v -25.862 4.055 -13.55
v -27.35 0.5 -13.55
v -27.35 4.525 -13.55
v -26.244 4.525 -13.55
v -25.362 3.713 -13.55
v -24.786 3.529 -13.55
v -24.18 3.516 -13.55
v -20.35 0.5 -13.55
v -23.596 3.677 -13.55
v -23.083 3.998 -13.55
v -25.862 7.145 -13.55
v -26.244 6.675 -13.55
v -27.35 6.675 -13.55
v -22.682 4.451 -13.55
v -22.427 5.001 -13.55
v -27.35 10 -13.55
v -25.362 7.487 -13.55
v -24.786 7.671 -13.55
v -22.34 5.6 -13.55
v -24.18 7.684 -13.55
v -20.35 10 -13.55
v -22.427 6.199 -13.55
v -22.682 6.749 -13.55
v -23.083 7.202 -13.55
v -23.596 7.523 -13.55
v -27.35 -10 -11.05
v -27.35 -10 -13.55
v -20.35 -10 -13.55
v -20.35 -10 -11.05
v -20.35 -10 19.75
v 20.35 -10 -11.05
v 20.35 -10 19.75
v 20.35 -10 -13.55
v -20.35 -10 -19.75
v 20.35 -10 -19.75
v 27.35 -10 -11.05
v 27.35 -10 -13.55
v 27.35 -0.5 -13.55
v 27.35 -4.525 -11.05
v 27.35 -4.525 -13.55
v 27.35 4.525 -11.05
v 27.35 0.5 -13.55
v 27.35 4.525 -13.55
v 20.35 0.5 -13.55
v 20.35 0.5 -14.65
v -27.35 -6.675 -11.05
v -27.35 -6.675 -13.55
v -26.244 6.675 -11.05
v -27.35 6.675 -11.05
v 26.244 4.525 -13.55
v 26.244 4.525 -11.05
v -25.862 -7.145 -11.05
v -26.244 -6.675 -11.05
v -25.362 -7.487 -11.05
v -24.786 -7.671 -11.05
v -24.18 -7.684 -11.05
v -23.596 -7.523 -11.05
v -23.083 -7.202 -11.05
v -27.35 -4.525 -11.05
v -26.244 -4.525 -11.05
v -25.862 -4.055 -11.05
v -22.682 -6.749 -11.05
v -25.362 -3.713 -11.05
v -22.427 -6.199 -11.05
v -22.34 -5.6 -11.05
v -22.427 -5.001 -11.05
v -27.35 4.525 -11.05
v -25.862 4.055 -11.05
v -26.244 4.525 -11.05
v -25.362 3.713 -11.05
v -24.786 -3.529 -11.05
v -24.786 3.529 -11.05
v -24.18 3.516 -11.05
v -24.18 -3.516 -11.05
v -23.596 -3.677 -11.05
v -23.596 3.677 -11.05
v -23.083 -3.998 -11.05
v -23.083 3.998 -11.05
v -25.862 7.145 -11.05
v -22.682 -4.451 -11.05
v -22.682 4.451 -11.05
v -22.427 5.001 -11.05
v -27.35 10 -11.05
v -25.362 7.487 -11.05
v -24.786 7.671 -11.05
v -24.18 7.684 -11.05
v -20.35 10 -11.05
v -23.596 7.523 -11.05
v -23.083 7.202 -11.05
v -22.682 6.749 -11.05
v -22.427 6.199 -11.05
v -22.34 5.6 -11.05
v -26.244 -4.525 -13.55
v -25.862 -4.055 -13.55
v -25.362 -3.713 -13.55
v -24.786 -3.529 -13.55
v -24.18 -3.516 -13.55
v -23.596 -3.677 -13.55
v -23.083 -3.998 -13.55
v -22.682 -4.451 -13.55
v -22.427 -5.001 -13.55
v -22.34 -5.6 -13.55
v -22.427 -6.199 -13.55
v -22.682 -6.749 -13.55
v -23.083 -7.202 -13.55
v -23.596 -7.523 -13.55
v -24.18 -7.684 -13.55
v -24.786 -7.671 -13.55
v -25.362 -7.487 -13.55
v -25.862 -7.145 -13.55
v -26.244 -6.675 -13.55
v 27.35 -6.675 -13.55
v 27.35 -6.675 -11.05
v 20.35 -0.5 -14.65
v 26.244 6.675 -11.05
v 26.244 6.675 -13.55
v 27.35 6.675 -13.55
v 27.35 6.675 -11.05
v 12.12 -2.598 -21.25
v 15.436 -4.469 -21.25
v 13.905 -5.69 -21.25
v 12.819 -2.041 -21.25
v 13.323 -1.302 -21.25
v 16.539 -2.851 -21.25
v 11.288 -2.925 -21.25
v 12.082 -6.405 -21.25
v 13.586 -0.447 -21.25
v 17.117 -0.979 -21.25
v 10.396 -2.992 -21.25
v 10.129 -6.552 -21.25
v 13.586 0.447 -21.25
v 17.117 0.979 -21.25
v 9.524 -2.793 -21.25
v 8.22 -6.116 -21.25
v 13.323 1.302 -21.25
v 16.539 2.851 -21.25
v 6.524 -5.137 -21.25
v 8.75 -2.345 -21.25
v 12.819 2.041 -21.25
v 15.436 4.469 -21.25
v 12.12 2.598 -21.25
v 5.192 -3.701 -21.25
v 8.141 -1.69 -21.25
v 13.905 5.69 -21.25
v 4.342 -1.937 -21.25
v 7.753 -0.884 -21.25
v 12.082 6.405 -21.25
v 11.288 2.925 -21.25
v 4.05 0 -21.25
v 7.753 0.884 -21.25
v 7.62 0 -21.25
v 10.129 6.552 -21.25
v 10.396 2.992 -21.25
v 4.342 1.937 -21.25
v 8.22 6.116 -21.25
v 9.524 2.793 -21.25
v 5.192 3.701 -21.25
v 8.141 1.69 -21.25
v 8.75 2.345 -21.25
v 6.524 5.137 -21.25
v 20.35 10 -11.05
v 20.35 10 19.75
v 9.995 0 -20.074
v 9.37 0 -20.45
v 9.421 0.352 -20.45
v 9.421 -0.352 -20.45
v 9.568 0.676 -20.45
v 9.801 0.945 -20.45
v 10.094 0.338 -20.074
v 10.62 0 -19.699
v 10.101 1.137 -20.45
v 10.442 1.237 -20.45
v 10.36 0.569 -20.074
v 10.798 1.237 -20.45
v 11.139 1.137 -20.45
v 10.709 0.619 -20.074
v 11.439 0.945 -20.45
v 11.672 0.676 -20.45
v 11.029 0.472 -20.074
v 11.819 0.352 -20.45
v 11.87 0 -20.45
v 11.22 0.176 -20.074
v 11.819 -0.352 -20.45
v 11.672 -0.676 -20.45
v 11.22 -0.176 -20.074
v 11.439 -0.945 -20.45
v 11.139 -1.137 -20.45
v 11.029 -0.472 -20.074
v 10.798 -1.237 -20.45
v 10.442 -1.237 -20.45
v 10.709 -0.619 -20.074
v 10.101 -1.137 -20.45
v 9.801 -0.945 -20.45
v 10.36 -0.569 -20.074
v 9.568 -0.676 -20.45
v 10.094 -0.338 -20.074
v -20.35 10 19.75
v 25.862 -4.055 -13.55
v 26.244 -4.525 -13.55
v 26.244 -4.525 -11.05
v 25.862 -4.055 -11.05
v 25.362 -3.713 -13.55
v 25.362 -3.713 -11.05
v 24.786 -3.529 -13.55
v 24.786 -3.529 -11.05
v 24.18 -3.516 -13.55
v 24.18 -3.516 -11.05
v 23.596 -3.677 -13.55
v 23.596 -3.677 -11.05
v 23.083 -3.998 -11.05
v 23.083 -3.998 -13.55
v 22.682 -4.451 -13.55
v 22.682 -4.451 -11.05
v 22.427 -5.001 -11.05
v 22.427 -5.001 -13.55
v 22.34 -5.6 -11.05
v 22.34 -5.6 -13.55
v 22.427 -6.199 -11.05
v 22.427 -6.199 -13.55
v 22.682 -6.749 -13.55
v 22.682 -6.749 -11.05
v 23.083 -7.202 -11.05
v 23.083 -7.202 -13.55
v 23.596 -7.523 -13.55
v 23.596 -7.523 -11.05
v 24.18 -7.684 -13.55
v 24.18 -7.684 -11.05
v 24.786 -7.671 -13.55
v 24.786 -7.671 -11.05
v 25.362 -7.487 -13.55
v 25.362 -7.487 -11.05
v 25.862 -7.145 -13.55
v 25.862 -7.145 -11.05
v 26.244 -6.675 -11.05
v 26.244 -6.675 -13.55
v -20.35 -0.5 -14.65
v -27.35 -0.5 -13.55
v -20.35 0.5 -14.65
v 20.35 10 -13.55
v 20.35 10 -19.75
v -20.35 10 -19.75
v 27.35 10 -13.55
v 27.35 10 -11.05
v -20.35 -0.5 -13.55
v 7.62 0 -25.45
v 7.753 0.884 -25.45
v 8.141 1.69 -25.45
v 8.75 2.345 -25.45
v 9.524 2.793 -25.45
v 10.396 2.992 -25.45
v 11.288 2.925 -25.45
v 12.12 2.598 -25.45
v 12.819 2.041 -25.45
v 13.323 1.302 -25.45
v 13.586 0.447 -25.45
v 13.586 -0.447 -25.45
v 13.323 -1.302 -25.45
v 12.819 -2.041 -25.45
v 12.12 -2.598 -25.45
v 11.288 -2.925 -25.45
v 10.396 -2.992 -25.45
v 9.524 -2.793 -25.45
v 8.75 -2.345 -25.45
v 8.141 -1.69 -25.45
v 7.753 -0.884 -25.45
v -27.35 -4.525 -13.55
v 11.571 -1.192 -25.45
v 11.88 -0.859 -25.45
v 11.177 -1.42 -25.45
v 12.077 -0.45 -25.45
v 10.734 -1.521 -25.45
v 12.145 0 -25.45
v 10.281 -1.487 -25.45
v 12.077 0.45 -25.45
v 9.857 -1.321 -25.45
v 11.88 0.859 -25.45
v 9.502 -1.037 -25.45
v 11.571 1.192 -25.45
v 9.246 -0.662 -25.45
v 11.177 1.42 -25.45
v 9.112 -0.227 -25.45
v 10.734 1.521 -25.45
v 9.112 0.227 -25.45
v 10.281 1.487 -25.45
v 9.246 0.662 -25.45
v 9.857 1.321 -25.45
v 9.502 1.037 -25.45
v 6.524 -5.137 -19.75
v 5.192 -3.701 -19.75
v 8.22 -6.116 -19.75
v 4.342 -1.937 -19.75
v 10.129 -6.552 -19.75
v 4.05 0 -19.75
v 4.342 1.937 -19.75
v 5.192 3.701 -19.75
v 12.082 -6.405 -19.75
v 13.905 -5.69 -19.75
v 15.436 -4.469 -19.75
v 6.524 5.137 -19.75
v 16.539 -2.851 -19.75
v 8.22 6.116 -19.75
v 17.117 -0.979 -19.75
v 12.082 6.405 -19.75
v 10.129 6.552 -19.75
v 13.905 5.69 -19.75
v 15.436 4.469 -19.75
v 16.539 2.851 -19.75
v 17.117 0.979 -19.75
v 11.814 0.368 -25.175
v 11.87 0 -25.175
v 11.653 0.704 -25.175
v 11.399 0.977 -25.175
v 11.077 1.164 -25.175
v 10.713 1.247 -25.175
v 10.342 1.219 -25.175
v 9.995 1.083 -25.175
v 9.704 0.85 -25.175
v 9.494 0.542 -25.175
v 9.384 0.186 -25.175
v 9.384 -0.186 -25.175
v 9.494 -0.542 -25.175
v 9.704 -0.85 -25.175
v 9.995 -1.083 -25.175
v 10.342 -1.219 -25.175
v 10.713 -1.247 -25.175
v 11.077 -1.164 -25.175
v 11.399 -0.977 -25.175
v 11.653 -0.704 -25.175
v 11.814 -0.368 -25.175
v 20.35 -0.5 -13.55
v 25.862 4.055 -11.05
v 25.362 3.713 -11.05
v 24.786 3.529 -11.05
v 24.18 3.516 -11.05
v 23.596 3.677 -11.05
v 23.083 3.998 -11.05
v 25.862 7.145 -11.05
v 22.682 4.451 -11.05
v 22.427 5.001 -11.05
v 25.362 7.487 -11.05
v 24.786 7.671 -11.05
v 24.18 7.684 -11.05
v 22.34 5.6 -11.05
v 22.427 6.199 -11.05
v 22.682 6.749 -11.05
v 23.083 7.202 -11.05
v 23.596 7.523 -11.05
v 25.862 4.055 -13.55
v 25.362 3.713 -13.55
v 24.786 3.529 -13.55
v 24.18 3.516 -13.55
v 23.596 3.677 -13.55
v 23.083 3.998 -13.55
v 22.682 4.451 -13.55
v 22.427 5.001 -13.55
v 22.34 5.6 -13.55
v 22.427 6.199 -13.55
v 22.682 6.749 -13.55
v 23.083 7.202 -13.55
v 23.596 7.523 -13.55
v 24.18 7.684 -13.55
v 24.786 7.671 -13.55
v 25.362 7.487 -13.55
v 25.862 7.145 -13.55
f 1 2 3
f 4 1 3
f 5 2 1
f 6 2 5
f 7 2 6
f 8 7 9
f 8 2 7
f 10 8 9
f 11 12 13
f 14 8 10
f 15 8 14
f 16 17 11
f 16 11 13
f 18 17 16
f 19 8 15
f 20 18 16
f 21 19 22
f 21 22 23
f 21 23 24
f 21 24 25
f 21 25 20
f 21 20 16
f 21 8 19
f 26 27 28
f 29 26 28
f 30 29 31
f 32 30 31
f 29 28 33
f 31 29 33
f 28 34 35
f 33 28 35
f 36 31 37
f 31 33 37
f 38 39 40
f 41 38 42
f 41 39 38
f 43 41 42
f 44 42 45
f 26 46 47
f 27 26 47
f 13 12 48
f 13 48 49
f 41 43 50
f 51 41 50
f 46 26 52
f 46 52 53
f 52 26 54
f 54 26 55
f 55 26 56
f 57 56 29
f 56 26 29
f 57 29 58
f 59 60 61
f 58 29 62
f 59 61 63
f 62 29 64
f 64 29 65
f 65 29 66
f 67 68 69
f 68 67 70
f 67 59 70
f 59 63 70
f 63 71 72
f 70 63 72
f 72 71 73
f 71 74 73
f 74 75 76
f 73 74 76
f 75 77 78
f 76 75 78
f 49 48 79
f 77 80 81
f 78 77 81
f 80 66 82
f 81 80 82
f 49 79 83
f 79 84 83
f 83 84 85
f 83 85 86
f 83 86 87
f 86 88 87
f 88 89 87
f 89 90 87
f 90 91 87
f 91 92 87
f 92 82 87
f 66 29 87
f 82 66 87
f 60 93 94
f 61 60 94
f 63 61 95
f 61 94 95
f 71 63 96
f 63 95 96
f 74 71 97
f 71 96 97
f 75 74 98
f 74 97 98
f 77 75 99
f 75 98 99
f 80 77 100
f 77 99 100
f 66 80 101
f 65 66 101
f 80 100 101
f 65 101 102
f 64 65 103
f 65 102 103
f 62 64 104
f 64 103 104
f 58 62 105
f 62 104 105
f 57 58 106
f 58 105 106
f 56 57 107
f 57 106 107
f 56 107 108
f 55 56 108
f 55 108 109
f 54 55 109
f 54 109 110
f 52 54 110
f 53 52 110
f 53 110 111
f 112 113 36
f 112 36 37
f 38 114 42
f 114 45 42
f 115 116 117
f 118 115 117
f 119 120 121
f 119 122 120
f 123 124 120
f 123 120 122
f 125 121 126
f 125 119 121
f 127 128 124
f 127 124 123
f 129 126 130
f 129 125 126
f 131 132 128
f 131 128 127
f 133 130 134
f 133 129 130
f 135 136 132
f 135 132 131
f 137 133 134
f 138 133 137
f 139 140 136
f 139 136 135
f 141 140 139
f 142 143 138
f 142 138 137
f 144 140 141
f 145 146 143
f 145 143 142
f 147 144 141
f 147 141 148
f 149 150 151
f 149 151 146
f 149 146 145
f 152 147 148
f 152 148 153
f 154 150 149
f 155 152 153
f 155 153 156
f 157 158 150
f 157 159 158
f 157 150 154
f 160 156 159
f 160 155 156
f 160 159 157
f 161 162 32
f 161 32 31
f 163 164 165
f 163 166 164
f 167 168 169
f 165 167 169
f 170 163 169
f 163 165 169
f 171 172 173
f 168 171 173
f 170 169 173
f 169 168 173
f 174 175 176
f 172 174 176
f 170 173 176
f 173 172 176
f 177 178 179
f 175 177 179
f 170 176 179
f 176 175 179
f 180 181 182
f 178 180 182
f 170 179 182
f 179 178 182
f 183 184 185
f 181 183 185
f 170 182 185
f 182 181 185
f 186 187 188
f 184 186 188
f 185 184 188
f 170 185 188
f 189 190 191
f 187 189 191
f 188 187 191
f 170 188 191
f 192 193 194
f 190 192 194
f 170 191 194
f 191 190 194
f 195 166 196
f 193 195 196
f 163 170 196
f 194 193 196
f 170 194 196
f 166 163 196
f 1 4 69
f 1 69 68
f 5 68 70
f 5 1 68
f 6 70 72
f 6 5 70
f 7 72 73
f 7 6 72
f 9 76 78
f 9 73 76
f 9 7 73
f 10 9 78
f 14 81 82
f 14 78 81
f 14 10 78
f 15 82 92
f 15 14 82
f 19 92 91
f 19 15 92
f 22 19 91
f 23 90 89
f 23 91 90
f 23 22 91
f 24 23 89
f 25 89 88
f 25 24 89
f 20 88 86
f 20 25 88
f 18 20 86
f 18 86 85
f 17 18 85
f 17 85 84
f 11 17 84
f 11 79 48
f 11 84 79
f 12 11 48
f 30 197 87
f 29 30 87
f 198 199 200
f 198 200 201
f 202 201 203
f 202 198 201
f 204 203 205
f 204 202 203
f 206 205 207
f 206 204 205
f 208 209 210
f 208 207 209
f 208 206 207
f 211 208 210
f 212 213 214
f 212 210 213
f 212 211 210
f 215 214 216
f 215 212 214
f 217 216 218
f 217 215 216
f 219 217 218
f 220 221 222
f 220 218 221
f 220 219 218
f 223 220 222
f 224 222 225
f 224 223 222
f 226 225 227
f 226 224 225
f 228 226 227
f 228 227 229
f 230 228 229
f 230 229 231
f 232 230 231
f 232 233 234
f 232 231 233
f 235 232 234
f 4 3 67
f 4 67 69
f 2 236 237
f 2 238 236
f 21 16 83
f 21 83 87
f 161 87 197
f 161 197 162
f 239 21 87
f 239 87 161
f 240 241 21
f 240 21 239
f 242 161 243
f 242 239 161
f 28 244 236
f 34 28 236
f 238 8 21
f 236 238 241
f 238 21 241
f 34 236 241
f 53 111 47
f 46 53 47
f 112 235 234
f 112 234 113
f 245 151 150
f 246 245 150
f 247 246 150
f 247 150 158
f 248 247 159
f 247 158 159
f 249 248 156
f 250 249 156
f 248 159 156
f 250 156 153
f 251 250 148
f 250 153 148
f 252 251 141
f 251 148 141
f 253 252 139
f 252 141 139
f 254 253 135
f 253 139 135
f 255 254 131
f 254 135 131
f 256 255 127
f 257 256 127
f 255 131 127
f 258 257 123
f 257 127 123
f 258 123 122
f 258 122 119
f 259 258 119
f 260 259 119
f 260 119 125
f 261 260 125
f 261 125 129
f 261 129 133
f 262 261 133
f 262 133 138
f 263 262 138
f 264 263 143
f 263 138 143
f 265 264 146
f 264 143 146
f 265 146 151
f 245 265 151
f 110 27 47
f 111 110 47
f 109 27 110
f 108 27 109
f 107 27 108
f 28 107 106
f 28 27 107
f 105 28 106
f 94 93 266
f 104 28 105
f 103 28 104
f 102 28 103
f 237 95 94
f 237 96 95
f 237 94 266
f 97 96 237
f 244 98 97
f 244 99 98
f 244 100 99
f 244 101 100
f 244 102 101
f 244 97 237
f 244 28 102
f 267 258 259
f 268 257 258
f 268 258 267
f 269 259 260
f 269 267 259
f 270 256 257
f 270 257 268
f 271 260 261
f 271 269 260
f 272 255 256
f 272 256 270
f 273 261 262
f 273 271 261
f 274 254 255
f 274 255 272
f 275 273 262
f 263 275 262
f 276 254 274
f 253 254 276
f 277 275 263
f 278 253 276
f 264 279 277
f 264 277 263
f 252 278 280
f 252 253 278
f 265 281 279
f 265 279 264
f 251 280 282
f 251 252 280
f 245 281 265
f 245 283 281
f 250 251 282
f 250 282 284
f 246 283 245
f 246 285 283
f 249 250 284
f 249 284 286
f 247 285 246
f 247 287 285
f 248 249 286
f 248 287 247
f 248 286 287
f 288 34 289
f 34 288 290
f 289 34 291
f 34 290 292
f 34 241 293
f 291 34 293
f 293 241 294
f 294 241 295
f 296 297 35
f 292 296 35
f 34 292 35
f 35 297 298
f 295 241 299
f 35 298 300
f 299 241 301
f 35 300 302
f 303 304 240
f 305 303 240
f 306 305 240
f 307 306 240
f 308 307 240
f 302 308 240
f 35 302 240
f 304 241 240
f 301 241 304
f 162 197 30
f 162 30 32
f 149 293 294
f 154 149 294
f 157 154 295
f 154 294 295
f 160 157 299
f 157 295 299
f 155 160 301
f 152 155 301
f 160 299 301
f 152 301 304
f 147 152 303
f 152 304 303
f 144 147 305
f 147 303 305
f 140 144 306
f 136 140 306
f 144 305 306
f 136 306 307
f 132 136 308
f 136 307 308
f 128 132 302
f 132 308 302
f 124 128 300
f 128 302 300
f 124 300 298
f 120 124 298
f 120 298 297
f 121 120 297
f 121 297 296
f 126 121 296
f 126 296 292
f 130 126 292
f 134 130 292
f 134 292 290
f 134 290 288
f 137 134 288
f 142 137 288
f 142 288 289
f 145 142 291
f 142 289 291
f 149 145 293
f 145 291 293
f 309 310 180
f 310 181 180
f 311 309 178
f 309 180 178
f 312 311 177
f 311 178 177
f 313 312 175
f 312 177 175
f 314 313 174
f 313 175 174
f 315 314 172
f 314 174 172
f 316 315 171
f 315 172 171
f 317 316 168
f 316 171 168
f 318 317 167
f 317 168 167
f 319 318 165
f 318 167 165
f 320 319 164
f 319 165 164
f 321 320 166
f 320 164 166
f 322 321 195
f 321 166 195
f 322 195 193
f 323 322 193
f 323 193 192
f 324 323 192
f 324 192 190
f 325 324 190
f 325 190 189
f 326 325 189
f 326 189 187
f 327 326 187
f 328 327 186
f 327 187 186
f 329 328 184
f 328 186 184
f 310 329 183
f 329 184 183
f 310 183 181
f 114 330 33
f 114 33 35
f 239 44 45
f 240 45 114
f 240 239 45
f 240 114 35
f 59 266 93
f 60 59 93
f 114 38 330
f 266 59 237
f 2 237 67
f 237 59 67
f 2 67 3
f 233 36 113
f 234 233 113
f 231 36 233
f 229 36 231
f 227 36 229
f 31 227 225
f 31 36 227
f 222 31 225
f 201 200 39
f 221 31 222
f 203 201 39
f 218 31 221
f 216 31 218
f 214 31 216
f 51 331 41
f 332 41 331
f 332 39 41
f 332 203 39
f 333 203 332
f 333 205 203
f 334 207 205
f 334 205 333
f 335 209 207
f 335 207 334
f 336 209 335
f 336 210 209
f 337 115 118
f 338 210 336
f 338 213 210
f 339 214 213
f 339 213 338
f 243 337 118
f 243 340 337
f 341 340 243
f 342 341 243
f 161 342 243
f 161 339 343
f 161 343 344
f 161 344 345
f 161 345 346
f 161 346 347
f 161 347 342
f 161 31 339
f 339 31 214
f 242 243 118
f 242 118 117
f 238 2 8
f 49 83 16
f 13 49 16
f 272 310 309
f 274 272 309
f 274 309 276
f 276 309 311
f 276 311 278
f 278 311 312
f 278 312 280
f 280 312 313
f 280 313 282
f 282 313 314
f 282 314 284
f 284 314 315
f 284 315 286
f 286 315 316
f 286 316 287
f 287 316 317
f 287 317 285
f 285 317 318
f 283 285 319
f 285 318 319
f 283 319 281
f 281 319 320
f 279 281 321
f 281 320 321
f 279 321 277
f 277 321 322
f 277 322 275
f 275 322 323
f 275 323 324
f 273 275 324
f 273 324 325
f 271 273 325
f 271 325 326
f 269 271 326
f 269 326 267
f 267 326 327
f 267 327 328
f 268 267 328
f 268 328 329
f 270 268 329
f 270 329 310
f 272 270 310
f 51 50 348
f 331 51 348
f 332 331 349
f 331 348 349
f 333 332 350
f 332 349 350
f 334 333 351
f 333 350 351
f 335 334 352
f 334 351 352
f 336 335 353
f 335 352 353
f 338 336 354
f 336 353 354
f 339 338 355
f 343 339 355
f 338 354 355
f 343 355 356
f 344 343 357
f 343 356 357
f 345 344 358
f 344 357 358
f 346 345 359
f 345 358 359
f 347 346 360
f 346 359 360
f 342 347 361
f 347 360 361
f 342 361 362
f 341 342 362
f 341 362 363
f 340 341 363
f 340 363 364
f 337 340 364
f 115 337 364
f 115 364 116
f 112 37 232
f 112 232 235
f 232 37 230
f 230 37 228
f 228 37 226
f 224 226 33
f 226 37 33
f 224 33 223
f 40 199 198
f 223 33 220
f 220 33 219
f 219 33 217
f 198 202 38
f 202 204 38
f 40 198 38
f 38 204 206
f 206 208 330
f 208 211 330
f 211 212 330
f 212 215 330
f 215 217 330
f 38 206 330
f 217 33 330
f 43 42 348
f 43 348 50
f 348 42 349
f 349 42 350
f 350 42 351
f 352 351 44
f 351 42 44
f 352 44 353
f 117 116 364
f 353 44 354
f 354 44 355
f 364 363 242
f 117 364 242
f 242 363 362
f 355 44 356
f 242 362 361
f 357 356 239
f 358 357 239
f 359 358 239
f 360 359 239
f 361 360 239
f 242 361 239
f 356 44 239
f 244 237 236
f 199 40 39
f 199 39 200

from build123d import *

# Parameters (mm, degrees)
SKETCH1_W                       = 40.7
SKETCH1_H                       = 39.5
BOSS_EXTRUDE1_DEPTH             = 10
SKETCH2_W                       = 2.5
SKETCH2_H                       = 20
BOSS_EXTRUDE2_DEPTH             = 7
BOSS_EXTRUDE5_DEPTH             = 0.5
CUT_EXTRUDE1_DEPTH              = 34.3
SKETCH4_R                       = 6.57
BOSS_EXTRUDE3_DEPTH             = 1.5
SKETCH5_R                       = 3
BOSS_EXTRUDE4_DEPTH             = 4.2
M3X0_5_TAPPED_HOLE1_D           = 2.5
M3X0_5_TAPPED_HOLE1_DEPTH       = 5
M3X0_5_TAPPED_HOLE1_CSINK_D     = 3.05
M3X0_5_TAPPED_HOLE1_CSINK_ANGLE = 90
M3X0_5_TAPPED_HOLE1_TIP         = 0.751075774


with BuildPart() as part:
    # Sketch1 → Boss-Extrude1 (new body, symmetric)
    with BuildSketch(Plane(origin=(0, 0, 0), x_dir=(1, 0, 0), z_dir=(0, 1, 0))):
        Rectangle(SKETCH1_W, SKETCH1_H)
    extrude(amount=BOSS_EXTRUDE1_DEPTH, both=True)

    # Sketch2 → Boss-Extrude2 (add)
    with BuildSketch(Plane(origin=(20.35, 0, 0), x_dir=(0, 0, -1), z_dir=(1, 0, 0))):
        with Locations((12.3, 0)):
            Rectangle(SKETCH2_W, SKETCH2_H)
    boss_extrude2 = extrude(amount=BOSS_EXTRUDE2_DEPTH)

    # Sketch9 → Boss-Extrude5 (add, symmetric)
    with BuildSketch(Plane(origin=(0, 0, 0), x_dir=(1, 0, 0), z_dir=(0, 1, 0))):
        Polygon((20.35, 13.55), (20.35, 14.65), (27.35, 13.55), align=None)
    boss_extrude5 = extrude(amount=BOSS_EXTRUDE5_DEPTH, both=True)

    # Mirror1: Boss-Extrude2, Boss-Extrude5 across plane
    add(boss_extrude2.mirror(Plane(origin=(0, 0, 0), x_dir=(0, 0, 1), z_dir=(1, 0, 0))))
    add(boss_extrude5.mirror(Plane(origin=(0, 0, 0), x_dir=(0, 0, 1), z_dir=(1, 0, 0))))

    # Sketch3 → Cut-Extrude1 (cut, through all)
    with BuildSketch(Plane(origin=(0, 0, -13.55), x_dir=(-1, 0, 0), z_dir=(0, 0, -1))):
        with BuildLine():
            Line((-26.243988636, 6.675), (-27.35, 6.675))
            Line((-27.35, 6.675), (-27.35, 4.525))
            Line((-27.35, 4.525), (-26.243988636, 4.525))
            ThreePointArc((-26.243988636, 4.525), (-22.34, 5.6), (-26.243988636, 6.675))
        make_face()
        with BuildLine():
            Line((26.243988636, 6.675), (27.35, 6.675))
            Line((27.35, 6.675), (27.35, 4.525))
            Line((27.35, 4.525), (26.243988636, 4.525))
            ThreePointArc((26.243988636, 4.525), (22.34, 5.6), (26.243988636, 6.675))
        make_face()
    cut_extrude1 = extrude(amount=-CUT_EXTRUDE1_DEPTH, mode=Mode.SUBTRACT)

    # Mirror2: Cut-Extrude1 across plane
    add(cut_extrude1.mirror(Plane.ZX), mode=Mode.SUBTRACT)

    # Sketch4 → Boss-Extrude3 (add)
    with BuildSketch(Plane(origin=(0, 0, -19.75), x_dir=(-1, 0, 0), z_dir=(0, 0, -1))):
        with Locations((-10.62, 0)):
            Circle(SKETCH4_R)
    extrude(amount=BOSS_EXTRUDE3_DEPTH)

    # Sketch5 → Boss-Extrude4 (add)
    with BuildSketch(Plane(origin=(0, 0, -21.25), x_dir=(-1, 0, 0), z_dir=(0, 0, -1))):
        with Locations((-10.62, 0)):
            Circle(SKETCH5_R)
    extrude(amount=BOSS_EXTRUDE4_DEPTH)

    # M3x0.5 Tapped Hole1
    with Locations(Plane(origin=(0, 0, -25.45), x_dir=(-1, 0, 0), z_dir=(0, 0, -1))):
        with Locations((-10.62, 0)):
            CounterSinkHole(M3X0_5_TAPPED_HOLE1_D / 2, M3X0_5_TAPPED_HOLE1_CSINK_D / 2, depth=M3X0_5_TAPPED_HOLE1_DEPTH, counter_sink_angle=M3X0_5_TAPPED_HOLE1_CSINK_ANGLE)
            with Locations((0, 0, -(M3X0_5_TAPPED_HOLE1_DEPTH + M3X0_5_TAPPED_HOLE1_TIP / 2))):  # 118° drill point
                Cone(0, M3X0_5_TAPPED_HOLE1_D / 2, M3X0_5_TAPPED_HOLE1_TIP, mode=Mode.SUBTRACT)


solid = part.part
